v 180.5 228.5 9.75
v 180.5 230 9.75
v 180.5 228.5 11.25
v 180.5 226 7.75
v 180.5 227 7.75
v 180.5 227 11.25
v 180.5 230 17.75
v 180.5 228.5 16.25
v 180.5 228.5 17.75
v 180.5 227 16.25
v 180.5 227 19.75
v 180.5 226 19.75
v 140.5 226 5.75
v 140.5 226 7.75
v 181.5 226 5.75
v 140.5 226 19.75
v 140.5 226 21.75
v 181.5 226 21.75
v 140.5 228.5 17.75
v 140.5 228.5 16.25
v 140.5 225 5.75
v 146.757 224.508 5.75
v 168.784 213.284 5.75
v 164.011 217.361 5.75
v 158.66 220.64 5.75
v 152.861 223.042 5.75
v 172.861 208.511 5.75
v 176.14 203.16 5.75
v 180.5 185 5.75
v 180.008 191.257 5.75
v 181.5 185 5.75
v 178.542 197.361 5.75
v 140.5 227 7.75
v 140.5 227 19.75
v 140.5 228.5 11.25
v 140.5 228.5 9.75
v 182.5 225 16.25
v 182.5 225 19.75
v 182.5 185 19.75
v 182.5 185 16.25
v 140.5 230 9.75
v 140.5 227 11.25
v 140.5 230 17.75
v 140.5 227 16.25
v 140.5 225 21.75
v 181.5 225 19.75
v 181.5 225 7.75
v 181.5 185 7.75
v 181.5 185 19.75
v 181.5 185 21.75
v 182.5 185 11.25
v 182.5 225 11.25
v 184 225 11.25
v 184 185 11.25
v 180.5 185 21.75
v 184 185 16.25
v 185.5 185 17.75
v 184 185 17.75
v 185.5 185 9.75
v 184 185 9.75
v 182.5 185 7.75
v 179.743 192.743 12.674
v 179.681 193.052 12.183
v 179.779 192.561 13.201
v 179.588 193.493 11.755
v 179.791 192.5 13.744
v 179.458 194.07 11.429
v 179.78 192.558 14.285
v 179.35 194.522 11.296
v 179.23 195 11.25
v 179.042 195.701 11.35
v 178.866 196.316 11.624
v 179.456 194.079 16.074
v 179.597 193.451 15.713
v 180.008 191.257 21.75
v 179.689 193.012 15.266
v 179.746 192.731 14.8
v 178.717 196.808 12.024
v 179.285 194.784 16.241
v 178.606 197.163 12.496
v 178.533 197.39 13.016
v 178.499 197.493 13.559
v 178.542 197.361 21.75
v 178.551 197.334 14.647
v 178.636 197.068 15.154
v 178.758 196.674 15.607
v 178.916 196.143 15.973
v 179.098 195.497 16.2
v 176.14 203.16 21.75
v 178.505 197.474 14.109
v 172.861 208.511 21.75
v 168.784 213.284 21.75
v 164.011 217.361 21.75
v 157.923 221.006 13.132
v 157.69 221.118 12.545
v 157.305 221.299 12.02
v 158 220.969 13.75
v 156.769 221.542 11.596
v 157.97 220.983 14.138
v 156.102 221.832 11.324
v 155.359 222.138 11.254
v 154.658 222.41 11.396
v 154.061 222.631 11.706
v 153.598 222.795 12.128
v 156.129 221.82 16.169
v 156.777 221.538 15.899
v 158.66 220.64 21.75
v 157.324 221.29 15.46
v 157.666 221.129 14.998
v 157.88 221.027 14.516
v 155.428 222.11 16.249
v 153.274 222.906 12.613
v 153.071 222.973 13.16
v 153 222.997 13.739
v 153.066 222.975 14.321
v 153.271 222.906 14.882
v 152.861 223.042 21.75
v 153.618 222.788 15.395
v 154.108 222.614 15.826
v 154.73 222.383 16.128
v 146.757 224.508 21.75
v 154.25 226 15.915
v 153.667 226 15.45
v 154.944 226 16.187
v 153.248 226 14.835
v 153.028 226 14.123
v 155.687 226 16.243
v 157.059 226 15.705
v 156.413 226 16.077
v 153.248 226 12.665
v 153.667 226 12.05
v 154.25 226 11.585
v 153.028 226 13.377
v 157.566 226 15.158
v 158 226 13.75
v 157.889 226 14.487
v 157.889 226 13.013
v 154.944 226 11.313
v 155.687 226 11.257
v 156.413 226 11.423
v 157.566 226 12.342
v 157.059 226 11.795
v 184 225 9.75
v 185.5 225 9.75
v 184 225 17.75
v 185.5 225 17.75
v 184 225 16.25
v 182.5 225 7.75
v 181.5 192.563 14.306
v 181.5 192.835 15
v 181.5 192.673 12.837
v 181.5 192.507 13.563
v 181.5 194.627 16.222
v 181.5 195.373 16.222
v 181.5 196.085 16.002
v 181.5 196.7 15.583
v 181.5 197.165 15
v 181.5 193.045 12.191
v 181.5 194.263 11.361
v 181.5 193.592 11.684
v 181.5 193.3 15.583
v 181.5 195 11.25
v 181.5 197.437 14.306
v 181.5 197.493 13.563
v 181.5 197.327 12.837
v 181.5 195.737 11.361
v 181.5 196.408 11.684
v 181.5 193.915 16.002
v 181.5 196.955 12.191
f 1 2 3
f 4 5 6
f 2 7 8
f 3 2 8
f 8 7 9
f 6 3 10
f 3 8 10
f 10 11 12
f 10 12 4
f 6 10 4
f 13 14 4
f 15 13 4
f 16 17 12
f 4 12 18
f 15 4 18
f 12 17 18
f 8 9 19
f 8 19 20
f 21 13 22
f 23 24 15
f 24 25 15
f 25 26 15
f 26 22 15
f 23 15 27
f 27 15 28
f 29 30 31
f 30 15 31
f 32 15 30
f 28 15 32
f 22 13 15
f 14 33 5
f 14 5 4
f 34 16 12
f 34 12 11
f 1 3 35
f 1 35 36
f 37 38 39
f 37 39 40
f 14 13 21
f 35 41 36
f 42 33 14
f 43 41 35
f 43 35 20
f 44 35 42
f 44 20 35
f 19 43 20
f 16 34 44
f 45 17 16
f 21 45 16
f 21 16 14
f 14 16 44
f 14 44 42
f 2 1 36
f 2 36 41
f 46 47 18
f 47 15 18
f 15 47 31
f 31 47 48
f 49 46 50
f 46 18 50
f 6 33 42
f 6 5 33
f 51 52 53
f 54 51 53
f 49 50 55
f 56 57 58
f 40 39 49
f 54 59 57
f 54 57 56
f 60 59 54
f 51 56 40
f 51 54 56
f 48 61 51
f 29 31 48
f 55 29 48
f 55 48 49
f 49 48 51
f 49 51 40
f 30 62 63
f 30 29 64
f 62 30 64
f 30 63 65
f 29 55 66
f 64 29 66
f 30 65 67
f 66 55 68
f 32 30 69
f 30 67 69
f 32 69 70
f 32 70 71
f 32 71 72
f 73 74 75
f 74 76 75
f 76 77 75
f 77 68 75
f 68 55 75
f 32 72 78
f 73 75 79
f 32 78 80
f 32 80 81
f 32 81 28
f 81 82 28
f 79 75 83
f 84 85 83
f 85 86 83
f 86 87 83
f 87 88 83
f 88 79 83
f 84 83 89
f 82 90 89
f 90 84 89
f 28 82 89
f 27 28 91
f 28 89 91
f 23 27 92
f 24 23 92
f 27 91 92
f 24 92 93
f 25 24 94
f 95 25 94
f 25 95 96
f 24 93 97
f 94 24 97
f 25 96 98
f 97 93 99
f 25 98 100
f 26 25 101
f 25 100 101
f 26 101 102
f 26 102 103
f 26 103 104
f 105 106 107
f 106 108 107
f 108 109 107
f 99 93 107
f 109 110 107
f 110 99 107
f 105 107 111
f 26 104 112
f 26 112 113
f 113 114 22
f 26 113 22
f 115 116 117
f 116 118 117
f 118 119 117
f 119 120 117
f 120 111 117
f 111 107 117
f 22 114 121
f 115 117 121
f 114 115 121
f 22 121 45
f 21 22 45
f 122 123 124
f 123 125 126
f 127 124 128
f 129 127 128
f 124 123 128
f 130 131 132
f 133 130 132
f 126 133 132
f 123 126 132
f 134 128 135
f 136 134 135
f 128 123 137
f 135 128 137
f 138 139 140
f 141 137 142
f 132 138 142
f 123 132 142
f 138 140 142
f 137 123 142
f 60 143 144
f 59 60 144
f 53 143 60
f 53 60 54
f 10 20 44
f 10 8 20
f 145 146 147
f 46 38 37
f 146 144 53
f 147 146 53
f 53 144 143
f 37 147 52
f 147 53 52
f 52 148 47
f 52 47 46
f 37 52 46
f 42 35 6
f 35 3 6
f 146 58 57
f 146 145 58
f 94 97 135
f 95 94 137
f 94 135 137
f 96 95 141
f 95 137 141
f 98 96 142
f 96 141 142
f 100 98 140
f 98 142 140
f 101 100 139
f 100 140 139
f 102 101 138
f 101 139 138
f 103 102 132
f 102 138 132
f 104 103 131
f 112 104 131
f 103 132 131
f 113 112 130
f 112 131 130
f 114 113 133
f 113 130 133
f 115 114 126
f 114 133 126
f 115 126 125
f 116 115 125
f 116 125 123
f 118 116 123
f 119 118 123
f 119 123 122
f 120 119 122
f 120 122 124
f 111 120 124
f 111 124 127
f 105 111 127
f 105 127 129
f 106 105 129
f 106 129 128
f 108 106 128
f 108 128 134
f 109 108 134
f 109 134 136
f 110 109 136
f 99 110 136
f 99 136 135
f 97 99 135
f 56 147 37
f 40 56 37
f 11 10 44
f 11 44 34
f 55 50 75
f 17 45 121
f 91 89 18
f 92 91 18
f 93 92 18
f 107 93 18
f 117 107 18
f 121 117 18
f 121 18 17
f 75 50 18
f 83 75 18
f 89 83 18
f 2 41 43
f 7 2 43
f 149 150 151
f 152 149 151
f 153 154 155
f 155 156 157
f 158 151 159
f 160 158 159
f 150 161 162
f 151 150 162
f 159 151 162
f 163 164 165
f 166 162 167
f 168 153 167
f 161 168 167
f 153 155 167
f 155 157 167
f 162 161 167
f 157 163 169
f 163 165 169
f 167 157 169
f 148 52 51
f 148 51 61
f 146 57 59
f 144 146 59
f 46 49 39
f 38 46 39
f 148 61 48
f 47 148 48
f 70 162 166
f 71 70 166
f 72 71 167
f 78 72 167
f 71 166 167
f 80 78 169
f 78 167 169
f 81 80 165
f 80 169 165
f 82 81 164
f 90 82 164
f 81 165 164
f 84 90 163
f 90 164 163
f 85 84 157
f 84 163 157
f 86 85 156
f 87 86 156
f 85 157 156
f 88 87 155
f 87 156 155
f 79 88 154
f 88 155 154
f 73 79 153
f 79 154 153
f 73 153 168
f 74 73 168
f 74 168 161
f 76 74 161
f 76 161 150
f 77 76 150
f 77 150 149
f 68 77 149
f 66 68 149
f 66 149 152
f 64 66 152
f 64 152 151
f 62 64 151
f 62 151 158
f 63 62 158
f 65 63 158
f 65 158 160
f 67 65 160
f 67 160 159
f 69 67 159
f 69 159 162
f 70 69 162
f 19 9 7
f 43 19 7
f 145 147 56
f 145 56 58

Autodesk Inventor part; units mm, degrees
ref_plane "Work Plane1" through (208, 234.75, 13.75) normal (0, 0, 1) x (1, 0, 0)
ref_plane "Work Plane2" through (180.5, 225, 24) normal (-1, 0, 0) x (0, -1, 0)
sketch "Sketch4" plane through (180.5, 225, 24) normal (-1, 0, 0) x (0, -1, 0)
  line L0 (-20.75, -21) -> (-18.75, -21) construction
  line L1 (-18.75, -21) -> (-18.75, -15.25) construction
  line L2 (-18.75, -15.25) -> (-24.5, -15.25) construction
  line L3 (-24.5, -15.25) -> (-24.5, -17.25) construction
  line L4 (-24.5, -17.25) -> (-25.5, -17.25) construction
  line L5 (-25.5, -17.25) -> (-25.5, -19.25) construction
  line L6 (-25.5, -19.25) -> (-26.5, -19.25) construction
  line L7 (-26.5, -19.25) -> (-26.5, -20.5) construction
  arc A0 (-26.5, -20.5) -> (-24, -23) centre (-24, -20.5) ccw construction
  line L8 (-24, -23) -> (-22.75, -23) construction
  line L9 (-22.75, -23) -> (-22.75, -22) construction
  line L10 (-22.75, -22) -> (-20.75, -22) construction
  line L11 (-20.75, -22) -> (-20.75, -21) construction
  line L12 (-24.5, -3.25) -> (-24.5, -5.25) construction
  line L13 (-24.5, -5.25) -> (-18.75, -5.25) construction
  line L14 (-18.75, -5.25) -> (-18.75, 0.5) construction
  line L15 (-18.75, 0.5) -> (-20.75, 0.5) construction
  line L16 (-20.75, 0.5) -> (-20.75, 1.5) construction
  line L17 (-20.75, 1.5) -> (-22.75, 1.5) construction
  line L18 (-22.75, 1.5) -> (-22.75, 2.5) construction
  line L19 (-22.75, 2.5) -> (-24, 2.5) construction
  arc A1 (-24, 2.5) -> (-26.5, 0) centre (-24, 0) ccw construction
  line L20 (-26.5, 0) -> (-26.5, -1.25) construction
  line L21 (-26.5, -1.25) -> (-25.5, -1.25) construction
  line L22 (-25.5, -1.25) -> (-25.5, -3.25) construction
  line L23 (-25.5, -3.25) -> (-24.5, -3.25) construction
  line L24 (-6.75, 0.5) -> (-8.75, 0.5) construction
  line L25 (-8.75, 0.5) -> (-8.75, -5.25) construction
  line L26 (-8.75, -5.25) -> (-3, -5.25) construction
  line L27 (-3, -5.25) -> (-3, -3.25) construction
  line L28 (-3, -3.25) -> (-2, -3.25) construction
  line L29 (-2, -3.25) -> (-2, -1.25) construction
  line L30 (-2, -1.25) -> (-1, -1.25) construction
  line L31 (-1, -1.25) -> (-1, 0) construction
  arc A2 (-1, 0) -> (-3.5, 2.5) centre (-3.5, 0) ccw construction
  line L32 (-3.5, 2.5) -> (-4.75, 2.5) construction
  line L33 (-4.75, 2.5) -> (-4.75, 1.5) construction
  line L34 (-4.75, 1.5) -> (-6.75, 1.5) construction
  line L35 (-6.75, 1.5) -> (-6.75, 0.5) construction
  line L36 (-3, -17.25) -> (-3, -15.25) construction
  line L37 (-3, -15.25) -> (-8.75, -15.25) construction
  line L38 (-8.75, -15.25) -> (-8.75, -21) construction
  line L39 (-8.75, -21) -> (-6.75, -21) construction
  line L40 (-6.75, -21) -> (-6.75, -22) construction
  line L41 (-6.75, -22) -> (-4.75, -22) construction
  line L42 (-4.75, -22) -> (-4.75, -23) construction
  line L43 (-4.75, -23) -> (-3.5, -23) construction
  arc A3 (-3.5, -23) -> (-1, -20.5) centre (-3.5, -20.5) ccw construction
  line L44 (-1, -20.5) -> (-1, -19.25) construction
  line L45 (-1, -19.25) -> (-2, -19.25) construction
  line L46 (-2, -19.25) -> (-2, -17.25) construction
  line L47 (-2, -17.25) -> (-3, -17.25) construction
  line L48 (-11.2751, -13.432) -> (-10.568, -12.7249) construction
  line L49 (-10.568, -12.7249) -> (-11.6644, -11.6285) construction
  arc A4 (-11.6644, -11.6285) -> (-11.6644, -8.8715) centre (-13.75, -10.25) ccw construction
  line L50 (-11.6644, -8.8715) -> (-10.568, -7.7751) construction
  line L51 (-10.568, -7.7751) -> (-11.2751, -7.068) construction
  line L52 (-11.2751, -7.068) -> (-12.3715, -8.1644) construction
  arc A5 (-12.3715, -8.1644) -> (-15.1285, -8.1644) centre (-13.75, -10.25) ccw construction
  line L53 (-15.1285, -8.1644) -> (-16.2249, -7.068) construction
  line L54 (-16.2249, -7.068) -> (-16.932, -7.7751) construction
  line L55 (-16.932, -7.7751) -> (-15.8356, -8.8715) construction
  arc A6 (-15.8356, -8.8715) -> (-15.8356, -11.6285) centre (-13.75, -10.25) ccw construction
  line L56 (-15.8356, -11.6285) -> (-16.932, -12.7249) construction
  line L57 (-16.932, -12.7249) -> (-16.2249, -13.432) construction
  line L58 (-16.2249, -13.432) -> (-15.1285, -12.3356) construction
  arc A7 (-15.1285, -12.3356) -> (-12.3715, -12.3356) centre (-13.75, -10.25) ccw construction
  line L59 (-12.3715, -12.3356) -> (-11.2751, -13.432) construction
  line L60 (-3.5, -14.25) -> (-3.5, -12.75) construction
  line L61 (-3.5, -12.75) -> (-2, -12.75) construction
  line L62 (-2, -12.75) -> (-2, -16.25) construction
  line L63 (-2, -16.25) -> (-1, -16.25) construction
  line L64 (-1, -16.25) -> (-1, -18.25) construction
  line L65 (-1, -18.25) -> (0, -18.25) construction
  line L66 (0, -18.25) -> (0, -20.5) construction
  arc A8 (-3.5, -24) -> (0, -20.5) centre (-3.5, -20.5) ccw construction
  line L67 (-3.5, -24) -> (-5.75, -24) construction
  line L68 (-5.75, -24) -> (-5.75, -23) construction
  line L69 (-5.75, -23) -> (-7.75, -23) construction
  line L70 (-7.75, -23) -> (-7.75, -22) construction
  line L71 (-7.75, -22) -> (-11.25, -22) construction
  line L72 (-11.25, -22) -> (-11.25, -20.5) construction
  line L73 (-11.25, -20.5) -> (-9.75, -20.5) construction
  line L74 (-9.75, -20.5) -> (-9.75, -15.25) construction
  line L75 (-9.75, -15.25) -> (-17.75, -15.25) construction
  line L76 (-17.75, -15.25) -> (-17.75, -20.5) construction
  line L77 (-17.75, -20.5) -> (-16.25, -20.5) construction
  line L78 (-16.25, -20.5) -> (-16.25, -22) construction
  line L79 (-16.25, -22) -> (-19.75, -22) construction
  line L80 (-19.75, -22) -> (-19.75, -23) construction
  line L81 (-19.75, -23) -> (-21.75, -23) construction
  line L82 (-21.75, -23) -> (-21.75, -24) construction
  line L83 (-21.75, -24) -> (-24, -24) construction
  arc A9 (-27.5, -20.5) -> (-24, -24) centre (-24, -20.5) ccw construction
  line L84 (-27.5, -20.5) -> (-27.5, -18.25) construction
  line L85 (-27.5, -18.25) -> (-26.5, -18.25) construction
  line L86 (-26.5, -18.25) -> (-26.5, -16.25) construction
  line L87 (-26.5, -16.25) -> (-25.5, -16.25) construction
  line L88 (-25.5, -16.25) -> (-25.5, -12.75) construction
  line L89 (-25.5, -12.75) -> (-24, -12.75) construction
  line L90 (-24, -12.75) -> (-24, -14.25) construction
  line L91 (-24, -14.25) -> (-18.75, -14.25) construction
  line L92 (-18.75, -14.25) -> (-18.75, -6.25) construction
  line L93 (-18.75, -6.25) -> (-24, -6.25) construction
  line L94 (-24, -6.25) -> (-24, -7.75) construction
  line L95 (-24, -7.75) -> (-25.5, -7.75) construction
  line L96 (-25.5, -7.75) -> (-25.5, -4.25) construction
  line L97 (-25.5, -4.25) -> (-26.5, -4.25) construction
  line L98 (-26.5, -4.25) -> (-26.5, -2.25) construction
  line L99 (-26.5, -2.25) -> (-27.5, -2.25) construction
  line L100 (-27.5, -2.25) -> (-27.5, 0) construction
  arc A10 (-24, 3.5) -> (-27.5, 0) centre (-24, 0) ccw construction
  line L101 (-24, 3.5) -> (-21.75, 3.5) construction
  line L102 (-21.75, 3.5) -> (-21.75, 2.5) construction
  line L103 (-21.75, 2.5) -> (-19.75, 2.5) construction
  line L104 (-19.75, 2.5) -> (-19.75, 1.5) construction
  line L105 (-19.75, 1.5) -> (-16.25, 1.5) construction
  line L106 (-16.25, 1.5) -> (-16.25, 0) construction
  line L107 (-16.25, 0) -> (-17.75, 0) construction
  line L108 (-17.75, 0) -> (-17.75, -5.25) construction
  line L109 (-17.75, -5.25) -> (-9.75, -5.25) construction
  line L110 (-9.75, -5.25) -> (-9.75, 0) construction
  line L111 (-9.75, 0) -> (-11.25, 0) construction
  line L112 (-11.25, 0) -> (-11.25, 1.5) construction
  line L113 (-11.25, 1.5) -> (-7.75, 1.5) construction
  line L114 (-7.75, 1.5) -> (-7.75, 2.5) construction
  line L115 (-7.75, 2.5) -> (-5.75, 2.5) construction
  line L116 (-5.75, 2.5) -> (-5.75, 3.5) construction
  line L117 (-5.75, 3.5) -> (-3.5, 3.5) construction
  arc A11 (0, 0) -> (-3.5, 3.5) centre (-3.5, 0) ccw construction
  line L118 (0, 0) -> (0, -2.25) construction
  line L119 (0, -2.25) -> (-1, -2.25) construction
  line L120 (-1, -2.25) -> (-1, -4.25) construction
  line L121 (-1, -4.25) -> (-2, -4.25) construction
  line L122 (-2, -4.25) -> (-2, -7.75) construction
  line L123 (-2, -7.75) -> (-3.5, -7.75) construction
  line L124 (-3.5, -7.75) -> (-3.5, -6.25) construction
  line L125 (-3.5, -6.25) -> (-8.75, -6.25) construction
  line L126 (-8.75, -6.25) -> (-8.75, -14.25) construction
  line L127 (-8.75, -14.25) -> (-3.5, -14.25) construction
  line L128 (-3.5, -12.75) -> (-3.5, -14.25)
  line L129 (-3.5, -14.25) -> (-5, -14.25)
  line L130 (-5, -14.25) -> (-5, -6.25)
  line L131 (-3.5, -6.25) -> (-5, -6.25)
  line L132 (-3.5, -6.25) -> (-3.5, -7.75)
  line L133 (-3.5, -7.75) -> (-2, -7.75)
  line L134 (-3.5, -12.75) -> (-2, -12.75)
  line L135 (-2, -16.25) -> (-2, -12.75)
  line L136 (-2, -16.25) -> (-1, -16.25)
  line L137 (-1, -18.25) -> (-1, -16.25)
  line L138 (-1, -18.25) -> (0, -18.25)
  line L139 (-2, -7.75) -> (-2, -4.25)
  line L140 (-1, -4.25) -> (-2, -4.25)
  line L141 (-1, -4.25) -> (-1, -2.25)
  line L142 (0, -2.25) -> (-1, -2.25)
  line L143 (0, -18.25) -> (0, -2.25)
  point P0 (225, -24)
  dimension "d17" = 1.5
extrude "Extrusion4" add sketch "Sketch4" along normal blind 40
ref_plane "Work Plane3" through (208, 225, 3.5) normal (0, -1, 0) x (-1, 0, 0)
sketch "Sketch5" plane through (208, 225, 3.5) normal (0, -1, 0) x (-1, 0, 0)
  line L0 (6.75, -21) -> (8.75, -21) construction
  line L1 (8.75, -21) -> (8.75, -15.25) construction
  line L2 (8.75, -15.25) -> (3, -15.25) construction
  line L3 (3, -15.25) -> (3, -17.25) construction
  line L4 (3, -17.25) -> (2, -17.25) construction
  line L5 (2, -17.25) -> (2, -19.25) construction
  line L6 (2, -19.25) -> (1, -19.25) construction
  line L7 (1, -19.25) -> (1, -20.5) construction
  arc A0 (1, -20.5) -> (3.5, -23) centre (3.5, -20.5) ccw construction
  line L8 (3.5, -23) -> (4.75, -23) construction
  line L9 (4.75, -23) -> (4.75, -22) construction
  line L10 (4.75, -22) -> (6.75, -22) construction
  line L11 (6.75, -22) -> (6.75, -21) construction
  line L12 (3, -3.25) -> (3, -5.25) construction
  line L13 (3, -5.25) -> (8.75, -5.25) construction
  line L14 (8.75, -5.25) -> (8.75, 0.5) construction
  line L15 (8.75, 0.5) -> (6.75, 0.5) construction
  line L16 (6.75, 0.5) -> (6.75, 1.5) construction
  line L17 (6.75, 1.5) -> (4.75, 1.5) construction
  line L18 (4.75, 1.5) -> (4.75, 2.5) construction
  line L19 (4.75, 2.5) -> (3.5, 2.5) construction
  arc A1 (3.5, 2.5) -> (1, 0) centre (3.5, 0) ccw construction
  line L20 (1, 0) -> (1, -1.25) construction
  line L21 (1, -1.25) -> (2, -1.25) construction
  line L22 (2, -1.25) -> (2, -3.25) construction
  line L23 (2, -3.25) -> (3, -3.25) construction
  line L24 (20.75, 0.5) -> (18.75, 0.5) construction
  line L25 (18.75, 0.5) -> (18.75, -5.25) construction
  line L26 (18.75, -5.25) -> (24.5, -5.25) construction
  line L27 (24.5, -5.25) -> (24.5, -3.25) construction
  line L28 (24.5, -3.25) -> (25.5, -3.25) construction
  line L29 (25.5, -3.25) -> (25.5, -1.25) construction
  line L30 (25.5, -1.25) -> (26.5, -1.25) construction
  line L31 (26.5, -1.25) -> (26.5, 0) construction
  arc A2 (26.5, 0) -> (24, 2.5) centre (24, 0) ccw construction
  line L32 (24, 2.5) -> (22.75, 2.5) construction
  line L33 (22.75, 2.5) -> (22.75, 1.5) construction
  line L34 (22.75, 1.5) -> (20.75, 1.5) construction
  line L35 (20.75, 1.5) -> (20.75, 0.5) construction
  line L36 (24.5, -17.25) -> (24.5, -15.25) construction
  line L37 (24.5, -15.25) -> (18.75, -15.25) construction
  line L38 (18.75, -15.25) -> (18.75, -21) construction
  line L39 (18.75, -21) -> (20.75, -21) construction
  line L40 (20.75, -21) -> (20.75, -22) construction
  line L41 (20.75, -22) -> (22.75, -22) construction
  line L42 (22.75, -22) -> (22.75, -23) construction
  line L43 (22.75, -23) -> (24, -23) construction
  arc A3 (24, -23) -> (26.5, -20.5) centre (24, -20.5) ccw construction
  line L44 (26.5, -20.5) -> (26.5, -19.25) construction
  line L45 (26.5, -19.25) -> (25.5, -19.25) construction
  line L46 (25.5, -19.25) -> (25.5, -17.25) construction
  line L47 (25.5, -17.25) -> (24.5, -17.25) construction
  line L48 (16.2249, -13.432) -> (16.932, -12.7249) construction
  line L49 (16.932, -12.7249) -> (15.8356, -11.6285) construction
  arc A4 (15.8356, -11.6285) -> (15.8356, -8.8715) centre (13.75, -10.25) ccw construction
  line L50 (15.8356, -8.8715) -> (16.932, -7.7751) construction
  line L51 (16.932, -7.7751) -> (16.2249, -7.068) construction
  line L52 (16.2249, -7.068) -> (15.1285, -8.1644) construction
  arc A5 (15.1285, -8.1644) -> (12.3715, -8.1644) centre (13.75, -10.25) ccw construction
  line L53 (12.3715, -8.1644) -> (11.2751, -7.068) construction
  line L54 (11.2751, -7.068) -> (10.568, -7.7751) construction
  line L55 (10.568, -7.7751) -> (11.6644, -8.8715) construction
  arc A6 (11.6644, -8.8715) -> (11.6644, -11.6285) centre (13.75, -10.25) ccw construction
  line L56 (11.6644, -11.6285) -> (10.568, -12.7249) construction
  line L57 (10.568, -12.7249) -> (11.2751, -13.432) construction
  line L58 (11.2751, -13.432) -> (12.3715, -12.3356) construction
  arc A7 (12.3715, -12.3356) -> (15.1285, -12.3356) centre (13.75, -10.25) ccw construction
  line L59 (15.1285, -12.3356) -> (16.2249, -13.432) construction
  line L60 (24, -14.25) -> (24, -12.75) construction
  line L61 (24, -12.75) -> (25.5, -12.75) construction
  line L62 (25.5, -12.75) -> (25.5, -16.25) construction
  line L63 (25.5, -16.25) -> (26.5, -16.25) construction
  line L64 (26.5, -16.25) -> (26.5, -18.25) construction
  line L65 (26.5, -18.25) -> (27.5, -18.25) construction
  line L66 (27.5, -18.25) -> (27.5, -20.5) construction
  arc A8 (24, -24) -> (27.5, -20.5) centre (24, -20.5) ccw construction
  line L67 (24, -24) -> (21.75, -24) construction
  line L68 (21.75, -24) -> (21.75, -23) construction
  line L69 (21.75, -23) -> (19.75, -23) construction
  line L70 (19.75, -23) -> (19.75, -22) construction
  line L71 (19.75, -22) -> (16.25, -22) construction
  line L72 (16.25, -22) -> (16.25, -20.5) construction
  line L73 (16.25, -20.5) -> (17.75, -20.5) construction
  line L74 (17.75, -20.5) -> (17.75, -15.25) construction
  line L75 (17.75, -15.25) -> (9.75, -15.25) construction
  line L76 (9.75, -15.25) -> (9.75, -20.5) construction
  line L77 (9.75, -20.5) -> (11.25, -20.5) construction
  line L78 (11.25, -20.5) -> (11.25, -22) construction
  line L79 (11.25, -22) -> (7.75, -22) construction
  line L80 (7.75, -22) -> (7.75, -23) construction
  line L81 (7.75, -23) -> (5.75, -23) construction
  line L82 (5.75, -23) -> (5.75, -24) construction
  line L83 (5.75, -24) -> (3.5, -24) construction
  arc A9 (0, -20.5) -> (3.5, -24) centre (3.5, -20.5) ccw construction
  line L84 (0, -20.5) -> (0, -18.25) construction
  line L85 (0, -18.25) -> (1, -18.25) construction
  line L86 (1, -18.25) -> (1, -16.25) construction
  line L87 (1, -16.25) -> (2, -16.25) construction
  line L88 (2, -16.25) -> (2, -12.75) construction
  line L89 (2, -12.75) -> (3.5, -12.75) construction
  line L90 (3.5, -12.75) -> (3.5, -14.25) construction
  line L91 (3.5, -14.25) -> (8.75, -14.25) construction
  line L92 (8.75, -14.25) -> (8.75, -6.25) construction
  line L93 (8.75, -6.25) -> (3.5, -6.25) construction
  line L94 (3.5, -6.25) -> (3.5, -7.75) construction
  line L95 (3.5, -7.75) -> (2, -7.75) construction
  line L96 (2, -7.75) -> (2, -4.25) construction
  line L97 (2, -4.25) -> (1, -4.25) construction
  line L98 (1, -4.25) -> (1, -2.25) construction
  line L99 (1, -2.25) -> (0, -2.25) construction
  line L100 (0, -2.25) -> (0, 0) construction
  arc A10 (3.5, 3.5) -> (0, 0) centre (3.5, 0) ccw construction
  line L101 (3.5, 3.5) -> (5.75, 3.5) construction
  line L102 (5.75, 3.5) -> (5.75, 2.5) construction
  line L103 (5.75, 2.5) -> (7.75, 2.5) construction
  line L104 (7.75, 2.5) -> (7.75, 1.5) construction
  line L105 (7.75, 1.5) -> (11.25, 1.5) construction
  line L106 (11.25, 1.5) -> (11.25, 0) construction
  line L107 (11.25, 0) -> (9.75, 0) construction
  line L108 (9.75, 0) -> (9.75, -5.25) construction
  line L109 (9.75, -5.25) -> (17.75, -5.25) construction
  line L110 (17.75, -5.25) -> (17.75, 0) construction
  line L111 (17.75, 0) -> (16.25, 0) construction
  line L112 (16.25, 0) -> (16.25, 1.5) construction
  line L113 (16.25, 1.5) -> (19.75, 1.5) construction
  line L114 (19.75, 1.5) -> (19.75, 2.5) construction
  line L115 (19.75, 2.5) -> (21.75, 2.5) construction
  line L116 (21.75, 2.5) -> (21.75, 3.5) construction
  line L117 (21.75, 3.5) -> (24, 3.5) construction
  arc A11 (27.5, 0) -> (24, 3.5) centre (24, 0) ccw construction
  line L118 (27.5, 0) -> (27.5, -2.25) construction
  line L119 (27.5, -2.25) -> (26.5, -2.25) construction
  line L120 (26.5, -2.25) -> (26.5, -4.25) construction
  line L121 (26.5, -4.25) -> (25.5, -4.25) construction
  line L122 (25.5, -4.25) -> (25.5, -7.75) construction
  line L123 (25.5, -7.75) -> (24, -7.75) construction
  line L124 (24, -7.75) -> (24, -6.25) construction
  line L125 (24, -6.25) -> (18.75, -6.25) construction
  line L126 (18.75, -6.25) -> (18.75, -14.25) construction
  line L127 (18.75, -14.25) -> (24, -14.25) construction
  line L128 (27.5, -18.25) -> (26.5, -18.25)
  line L129 (26.5, -16.25) -> (26.5, -18.25)
  line L130 (26.5, -16.25) -> (25.5, -16.25)
  line L131 (25.5, -16.25) -> (25.5, -12.75)
  line L132 (24, -12.75) -> (25.5, -12.75)
  line L133 (24, -12.75) -> (24, -14.25)
  line L134 (24, -14.25) -> (22.5, -14.25)
  line L135 (22.5, -14.25) -> (22.5, -6.25)
  line L136 (24, -6.25) -> (22.5, -6.25)
  line L137 (24, -6.25) -> (24, -7.75)
  line L138 (25.5, -7.75) -> (24, -7.75)
  line L139 (25.5, -7.75) -> (25.5, -4.25)
  line L140 (25.5, -4.25) -> (26.5, -4.25)
  line L141 (26.5, -2.25) -> (26.5, -4.25)
  line L142 (26.5, -2.25) -> (27.5, -2.25)
  line L143 (27.5, -18.25) -> (27.5, -2.25)
  point P0 (208, 3.5)
  dimension "d20" = 1.5
extrude "Extrusion5" add sketch "Sketch5" along normal blind 40
sketch "Sketch6" plane through (140.5, 226, 21.75) normal (0, 0, 1) x (1, 0, 0)
  line L0 (40, 0) -> (0, 0) construction
  line L1 (40, -1) -> (0, -1) construction
  line L2 (40, -1) -> (40, -41) construction
  arc A0 (40, -41) -> (0, -1) centre (0, -41) ccw
  line L3 (0, -1) -> (40, -1)
  line L4 (40, -41) -> (40, -1)
  line L5 (40, 0) -> (41, 0)
  line L6 (41, 0) -> (41, -1)
  line L7 (41, -1) -> (40, -1)
  line L8 (40, -1) -> (40, 0)
  point P0 (-140.5, -226)
  dimension "d23" = 40
  dimension "d26" = 1
extrude "Extrusion6" add sketch "Sketch6" against normal up to surface (16 mm away)
sketch "Sketch7" plane through (140.5, 226, 19.75) normal (0, 1, 0) x (1, 0, 0)
  line L0 (0, 12) -> (0, 14) projected
  circle A0 centre (15, 6) radius 2.5
  point P0 (-140.5, 19.75)
  dimension "d27" = 5
  dimension "d28" = 15
extrude "Extrusion7" cut sketch "Sketch7" against normal through all
sketch "Sketch8" plane through (181.5, 185, 21.75) normal (1, 0, 0) x (0, 0, -1)
  line L0 (16, 0) -> (14, 0) projected
  circle A0 centre (8, 10) radius 2.5
  point P0 (21.75, -185)
  dimension "d31" = 5
  dimension "d32" = 10
extrude "Extrusion8" cut sketch "Sketch8" against normal through all
equation "\"d7\" = d5"
equation "\"d5\" = 4"
properties part number "angolo-profilati"
